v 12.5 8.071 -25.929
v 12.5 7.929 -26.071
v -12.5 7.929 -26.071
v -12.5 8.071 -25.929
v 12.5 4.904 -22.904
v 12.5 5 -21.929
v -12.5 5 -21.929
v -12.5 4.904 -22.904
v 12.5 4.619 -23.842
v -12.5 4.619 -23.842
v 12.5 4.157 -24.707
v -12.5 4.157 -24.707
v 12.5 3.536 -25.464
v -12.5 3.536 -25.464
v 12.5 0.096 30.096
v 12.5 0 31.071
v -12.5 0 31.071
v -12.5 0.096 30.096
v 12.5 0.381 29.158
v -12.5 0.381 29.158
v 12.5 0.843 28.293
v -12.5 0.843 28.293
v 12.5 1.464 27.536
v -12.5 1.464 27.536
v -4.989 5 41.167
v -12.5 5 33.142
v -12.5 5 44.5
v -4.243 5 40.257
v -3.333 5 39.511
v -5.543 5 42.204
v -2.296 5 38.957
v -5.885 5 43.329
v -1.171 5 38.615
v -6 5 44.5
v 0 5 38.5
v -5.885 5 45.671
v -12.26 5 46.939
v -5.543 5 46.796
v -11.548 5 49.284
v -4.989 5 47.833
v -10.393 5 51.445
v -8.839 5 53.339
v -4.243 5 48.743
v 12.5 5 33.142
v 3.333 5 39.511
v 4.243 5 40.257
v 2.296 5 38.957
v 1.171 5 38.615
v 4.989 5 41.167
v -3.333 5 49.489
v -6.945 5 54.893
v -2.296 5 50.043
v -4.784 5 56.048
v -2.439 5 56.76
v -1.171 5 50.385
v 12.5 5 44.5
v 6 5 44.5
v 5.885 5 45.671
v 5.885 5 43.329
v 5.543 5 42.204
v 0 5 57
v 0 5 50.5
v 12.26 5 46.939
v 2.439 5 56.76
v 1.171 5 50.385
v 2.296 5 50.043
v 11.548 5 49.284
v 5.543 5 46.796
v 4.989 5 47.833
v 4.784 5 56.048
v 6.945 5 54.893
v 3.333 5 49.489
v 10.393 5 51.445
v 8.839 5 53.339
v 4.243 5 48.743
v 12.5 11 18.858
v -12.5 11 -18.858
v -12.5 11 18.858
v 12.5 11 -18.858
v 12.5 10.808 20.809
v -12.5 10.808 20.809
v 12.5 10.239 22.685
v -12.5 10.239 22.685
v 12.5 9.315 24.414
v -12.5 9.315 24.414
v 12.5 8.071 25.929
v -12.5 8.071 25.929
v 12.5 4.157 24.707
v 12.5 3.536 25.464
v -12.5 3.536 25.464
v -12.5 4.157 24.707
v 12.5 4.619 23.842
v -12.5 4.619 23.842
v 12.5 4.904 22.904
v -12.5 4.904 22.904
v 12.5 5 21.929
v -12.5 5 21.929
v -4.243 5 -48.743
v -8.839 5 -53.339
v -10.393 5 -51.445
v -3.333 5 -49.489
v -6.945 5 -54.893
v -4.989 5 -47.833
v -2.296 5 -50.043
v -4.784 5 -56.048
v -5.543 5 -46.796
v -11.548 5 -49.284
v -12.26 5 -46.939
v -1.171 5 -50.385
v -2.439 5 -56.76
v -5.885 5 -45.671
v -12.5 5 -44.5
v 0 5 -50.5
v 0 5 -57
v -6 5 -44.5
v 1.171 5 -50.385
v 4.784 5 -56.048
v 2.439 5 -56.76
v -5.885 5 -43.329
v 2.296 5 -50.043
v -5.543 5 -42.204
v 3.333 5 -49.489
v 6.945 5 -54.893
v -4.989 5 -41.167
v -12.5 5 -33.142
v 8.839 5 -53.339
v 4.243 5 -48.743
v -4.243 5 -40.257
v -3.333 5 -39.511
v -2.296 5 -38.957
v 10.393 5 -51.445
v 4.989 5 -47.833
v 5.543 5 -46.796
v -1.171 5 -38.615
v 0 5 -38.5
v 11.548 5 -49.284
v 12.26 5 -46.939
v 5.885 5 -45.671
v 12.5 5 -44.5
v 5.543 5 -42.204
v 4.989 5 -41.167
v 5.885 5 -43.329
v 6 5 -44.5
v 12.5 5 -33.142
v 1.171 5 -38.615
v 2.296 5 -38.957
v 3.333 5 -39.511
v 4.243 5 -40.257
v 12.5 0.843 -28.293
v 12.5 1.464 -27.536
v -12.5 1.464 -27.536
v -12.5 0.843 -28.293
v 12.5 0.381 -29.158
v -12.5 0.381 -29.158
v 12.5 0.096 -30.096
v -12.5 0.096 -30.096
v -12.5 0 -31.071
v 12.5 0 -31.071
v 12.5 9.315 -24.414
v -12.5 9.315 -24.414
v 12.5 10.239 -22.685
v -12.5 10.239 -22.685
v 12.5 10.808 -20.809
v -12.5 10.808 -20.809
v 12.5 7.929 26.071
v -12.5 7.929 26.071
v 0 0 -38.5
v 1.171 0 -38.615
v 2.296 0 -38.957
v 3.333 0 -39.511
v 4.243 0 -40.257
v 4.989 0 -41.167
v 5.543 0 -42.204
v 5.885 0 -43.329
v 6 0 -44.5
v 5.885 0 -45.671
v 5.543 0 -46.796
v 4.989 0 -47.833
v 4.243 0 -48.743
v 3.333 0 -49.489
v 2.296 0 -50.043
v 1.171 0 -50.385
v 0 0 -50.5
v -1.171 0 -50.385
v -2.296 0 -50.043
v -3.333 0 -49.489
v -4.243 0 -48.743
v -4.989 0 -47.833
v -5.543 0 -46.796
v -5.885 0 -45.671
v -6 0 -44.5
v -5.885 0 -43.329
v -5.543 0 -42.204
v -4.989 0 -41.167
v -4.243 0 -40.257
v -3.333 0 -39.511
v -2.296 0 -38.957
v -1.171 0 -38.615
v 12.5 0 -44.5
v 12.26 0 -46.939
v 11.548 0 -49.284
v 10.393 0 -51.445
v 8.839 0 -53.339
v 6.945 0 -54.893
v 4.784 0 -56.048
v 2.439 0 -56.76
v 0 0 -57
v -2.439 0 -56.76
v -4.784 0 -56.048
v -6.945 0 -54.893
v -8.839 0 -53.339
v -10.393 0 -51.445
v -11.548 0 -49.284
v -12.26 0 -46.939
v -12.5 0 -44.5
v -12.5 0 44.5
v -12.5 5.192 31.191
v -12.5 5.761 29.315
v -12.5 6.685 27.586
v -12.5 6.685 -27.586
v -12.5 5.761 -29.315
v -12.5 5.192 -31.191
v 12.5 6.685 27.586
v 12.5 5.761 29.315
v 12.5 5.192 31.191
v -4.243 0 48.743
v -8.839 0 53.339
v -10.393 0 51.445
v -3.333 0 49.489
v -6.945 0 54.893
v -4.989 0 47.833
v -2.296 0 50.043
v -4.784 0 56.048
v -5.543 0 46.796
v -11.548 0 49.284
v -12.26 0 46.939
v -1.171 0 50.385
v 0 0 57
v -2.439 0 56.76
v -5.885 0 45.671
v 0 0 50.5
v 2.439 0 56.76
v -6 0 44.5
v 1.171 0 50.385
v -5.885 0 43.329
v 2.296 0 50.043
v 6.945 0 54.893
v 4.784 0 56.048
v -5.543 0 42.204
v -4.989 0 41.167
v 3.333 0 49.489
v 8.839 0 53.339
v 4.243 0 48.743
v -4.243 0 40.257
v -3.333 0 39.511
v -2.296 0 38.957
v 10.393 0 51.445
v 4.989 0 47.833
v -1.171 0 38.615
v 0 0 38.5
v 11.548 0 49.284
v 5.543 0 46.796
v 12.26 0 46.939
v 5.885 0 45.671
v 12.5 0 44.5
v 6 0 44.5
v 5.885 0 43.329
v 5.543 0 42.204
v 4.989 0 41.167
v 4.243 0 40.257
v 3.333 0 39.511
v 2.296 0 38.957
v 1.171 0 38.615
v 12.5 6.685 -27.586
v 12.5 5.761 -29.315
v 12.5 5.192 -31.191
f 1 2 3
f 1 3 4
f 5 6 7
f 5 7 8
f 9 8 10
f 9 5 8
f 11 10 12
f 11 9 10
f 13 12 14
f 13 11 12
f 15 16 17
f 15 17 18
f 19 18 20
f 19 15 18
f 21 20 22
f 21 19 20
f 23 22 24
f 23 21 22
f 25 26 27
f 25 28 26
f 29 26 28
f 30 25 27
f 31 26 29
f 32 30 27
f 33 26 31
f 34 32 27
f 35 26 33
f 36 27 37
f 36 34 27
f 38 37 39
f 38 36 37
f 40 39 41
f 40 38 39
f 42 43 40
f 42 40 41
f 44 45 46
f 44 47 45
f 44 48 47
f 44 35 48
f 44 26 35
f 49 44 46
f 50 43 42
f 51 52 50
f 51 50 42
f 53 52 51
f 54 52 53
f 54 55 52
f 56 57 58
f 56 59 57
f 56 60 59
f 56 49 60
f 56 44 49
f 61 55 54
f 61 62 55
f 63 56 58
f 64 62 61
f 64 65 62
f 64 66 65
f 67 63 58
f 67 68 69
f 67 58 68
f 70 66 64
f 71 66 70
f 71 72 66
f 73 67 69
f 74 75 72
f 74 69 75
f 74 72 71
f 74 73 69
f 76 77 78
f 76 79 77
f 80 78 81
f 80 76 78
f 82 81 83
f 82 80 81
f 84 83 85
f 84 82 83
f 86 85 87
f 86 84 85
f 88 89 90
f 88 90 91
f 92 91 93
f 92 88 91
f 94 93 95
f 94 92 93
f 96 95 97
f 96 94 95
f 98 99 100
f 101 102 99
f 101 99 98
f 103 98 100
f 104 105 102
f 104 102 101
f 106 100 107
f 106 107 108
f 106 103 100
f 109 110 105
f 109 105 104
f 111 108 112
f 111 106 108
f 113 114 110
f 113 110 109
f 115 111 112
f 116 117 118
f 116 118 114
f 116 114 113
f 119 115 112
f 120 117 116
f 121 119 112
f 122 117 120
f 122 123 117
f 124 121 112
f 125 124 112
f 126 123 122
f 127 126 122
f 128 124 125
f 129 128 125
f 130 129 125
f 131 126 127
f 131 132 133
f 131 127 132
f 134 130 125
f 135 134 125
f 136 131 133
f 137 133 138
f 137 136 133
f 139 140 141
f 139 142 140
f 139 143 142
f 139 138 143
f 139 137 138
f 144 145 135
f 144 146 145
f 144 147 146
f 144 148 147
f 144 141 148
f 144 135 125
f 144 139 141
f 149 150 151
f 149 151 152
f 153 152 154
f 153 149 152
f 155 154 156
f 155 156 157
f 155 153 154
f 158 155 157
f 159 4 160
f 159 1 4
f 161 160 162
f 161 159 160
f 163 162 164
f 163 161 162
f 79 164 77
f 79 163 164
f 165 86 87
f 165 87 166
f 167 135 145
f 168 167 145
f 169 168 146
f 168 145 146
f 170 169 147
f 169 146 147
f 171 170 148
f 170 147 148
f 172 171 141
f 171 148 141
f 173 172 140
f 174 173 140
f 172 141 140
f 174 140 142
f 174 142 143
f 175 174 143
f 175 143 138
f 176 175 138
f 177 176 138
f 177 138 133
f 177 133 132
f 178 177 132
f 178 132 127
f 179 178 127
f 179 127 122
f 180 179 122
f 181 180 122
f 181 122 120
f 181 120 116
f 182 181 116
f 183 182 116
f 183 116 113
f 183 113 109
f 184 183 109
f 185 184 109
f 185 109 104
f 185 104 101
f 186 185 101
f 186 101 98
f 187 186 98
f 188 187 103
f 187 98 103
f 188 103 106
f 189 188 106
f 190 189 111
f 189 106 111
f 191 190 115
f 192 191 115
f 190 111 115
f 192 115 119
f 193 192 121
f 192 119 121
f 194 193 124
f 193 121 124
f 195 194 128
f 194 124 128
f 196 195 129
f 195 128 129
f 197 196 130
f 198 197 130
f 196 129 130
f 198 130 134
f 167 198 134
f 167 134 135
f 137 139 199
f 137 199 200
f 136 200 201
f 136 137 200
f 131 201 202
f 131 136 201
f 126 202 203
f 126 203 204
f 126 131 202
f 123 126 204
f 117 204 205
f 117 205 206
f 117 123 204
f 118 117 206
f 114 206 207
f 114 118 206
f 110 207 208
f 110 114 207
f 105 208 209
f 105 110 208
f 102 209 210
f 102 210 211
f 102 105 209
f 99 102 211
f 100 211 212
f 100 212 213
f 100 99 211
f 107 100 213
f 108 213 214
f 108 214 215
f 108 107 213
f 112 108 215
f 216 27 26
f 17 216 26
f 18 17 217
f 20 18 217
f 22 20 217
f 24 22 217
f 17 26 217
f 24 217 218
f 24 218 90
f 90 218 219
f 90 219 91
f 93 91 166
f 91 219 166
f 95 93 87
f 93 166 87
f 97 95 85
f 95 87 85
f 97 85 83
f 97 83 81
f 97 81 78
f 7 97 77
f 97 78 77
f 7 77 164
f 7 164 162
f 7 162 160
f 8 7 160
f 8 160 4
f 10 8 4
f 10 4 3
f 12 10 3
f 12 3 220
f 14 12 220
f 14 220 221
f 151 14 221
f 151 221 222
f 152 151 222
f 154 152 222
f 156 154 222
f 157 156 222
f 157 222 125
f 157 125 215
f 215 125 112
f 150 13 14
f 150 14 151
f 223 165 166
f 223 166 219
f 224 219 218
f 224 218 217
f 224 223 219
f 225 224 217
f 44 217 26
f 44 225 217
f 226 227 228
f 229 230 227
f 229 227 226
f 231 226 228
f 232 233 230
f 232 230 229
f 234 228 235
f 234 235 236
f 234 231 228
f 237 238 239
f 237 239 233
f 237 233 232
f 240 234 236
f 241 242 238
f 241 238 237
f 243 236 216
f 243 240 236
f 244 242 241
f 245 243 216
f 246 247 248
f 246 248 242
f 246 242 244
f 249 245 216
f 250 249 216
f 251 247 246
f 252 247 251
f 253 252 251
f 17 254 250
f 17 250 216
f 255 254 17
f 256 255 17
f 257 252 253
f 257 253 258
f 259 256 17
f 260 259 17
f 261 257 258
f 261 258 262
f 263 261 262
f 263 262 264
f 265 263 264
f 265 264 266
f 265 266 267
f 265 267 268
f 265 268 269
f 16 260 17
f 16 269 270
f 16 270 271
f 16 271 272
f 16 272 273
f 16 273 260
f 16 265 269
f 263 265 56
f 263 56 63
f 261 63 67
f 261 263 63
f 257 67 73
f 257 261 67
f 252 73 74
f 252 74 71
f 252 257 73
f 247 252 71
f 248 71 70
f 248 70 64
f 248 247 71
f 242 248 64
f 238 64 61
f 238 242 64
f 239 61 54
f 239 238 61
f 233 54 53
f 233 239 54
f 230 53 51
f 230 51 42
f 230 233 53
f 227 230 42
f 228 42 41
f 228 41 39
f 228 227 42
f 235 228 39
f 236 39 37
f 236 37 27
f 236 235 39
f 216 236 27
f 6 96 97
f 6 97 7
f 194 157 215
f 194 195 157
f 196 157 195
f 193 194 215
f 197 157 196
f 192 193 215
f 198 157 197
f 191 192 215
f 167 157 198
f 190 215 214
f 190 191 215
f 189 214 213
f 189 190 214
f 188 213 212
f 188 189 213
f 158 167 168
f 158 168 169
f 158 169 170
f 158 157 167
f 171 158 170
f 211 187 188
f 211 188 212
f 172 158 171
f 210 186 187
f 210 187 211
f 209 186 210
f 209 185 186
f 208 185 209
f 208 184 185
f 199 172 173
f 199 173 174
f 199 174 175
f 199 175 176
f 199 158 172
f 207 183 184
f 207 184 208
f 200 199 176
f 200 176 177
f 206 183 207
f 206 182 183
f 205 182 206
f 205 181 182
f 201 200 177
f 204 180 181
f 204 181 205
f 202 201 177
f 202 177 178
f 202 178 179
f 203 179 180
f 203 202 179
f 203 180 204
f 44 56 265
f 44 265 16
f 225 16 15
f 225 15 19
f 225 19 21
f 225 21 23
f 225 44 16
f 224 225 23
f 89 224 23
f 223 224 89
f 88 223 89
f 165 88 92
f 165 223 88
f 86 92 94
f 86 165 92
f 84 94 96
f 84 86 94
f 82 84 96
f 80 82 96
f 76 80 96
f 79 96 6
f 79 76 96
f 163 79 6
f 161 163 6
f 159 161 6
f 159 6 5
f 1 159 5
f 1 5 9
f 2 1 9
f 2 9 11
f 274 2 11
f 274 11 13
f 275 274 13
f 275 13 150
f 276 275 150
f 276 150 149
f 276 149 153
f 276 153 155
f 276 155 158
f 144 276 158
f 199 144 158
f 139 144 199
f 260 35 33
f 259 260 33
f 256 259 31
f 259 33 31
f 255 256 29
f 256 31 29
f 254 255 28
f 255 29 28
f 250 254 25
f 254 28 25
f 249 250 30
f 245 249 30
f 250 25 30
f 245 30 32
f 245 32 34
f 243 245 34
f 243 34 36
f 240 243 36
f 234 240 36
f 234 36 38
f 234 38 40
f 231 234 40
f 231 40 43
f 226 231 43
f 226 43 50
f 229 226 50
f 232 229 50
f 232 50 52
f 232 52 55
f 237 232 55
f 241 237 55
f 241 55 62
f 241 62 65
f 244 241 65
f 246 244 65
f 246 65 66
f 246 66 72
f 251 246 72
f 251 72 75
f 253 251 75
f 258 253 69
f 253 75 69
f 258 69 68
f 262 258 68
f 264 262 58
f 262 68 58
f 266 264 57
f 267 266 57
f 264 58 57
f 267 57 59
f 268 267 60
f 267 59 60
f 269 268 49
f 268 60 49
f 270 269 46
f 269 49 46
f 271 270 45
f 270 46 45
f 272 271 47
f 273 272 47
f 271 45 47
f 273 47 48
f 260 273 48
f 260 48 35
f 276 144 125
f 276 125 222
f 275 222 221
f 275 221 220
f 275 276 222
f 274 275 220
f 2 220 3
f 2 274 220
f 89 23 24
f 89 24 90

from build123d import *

# Parameters (mm, degrees)
BOSS_EXTRUDE2_DEPTH = 12.5
SKETCH2_R           = 6
CUT_EXTRUDE1_DEPTH  = 59.662168388
FILLET1_RADIUS      = 12.5
FILLET1_LENGTH      = 5
FILLET2_RADIUS      = 12.5
FILLET2_LENGTH      = 5


with BuildPart() as part:
    # Sketch1 → Boss-Extrude2 (new, symmetric)
    with BuildSketch(Plane(origin=(0, 0, 0), x_dir=(0, 0, -1), z_dir=(1, 0, 0))):
        with BuildLine():
            Line((0, 5), (0, 11))
            Line((0, 11), (-18.857864376, 11))
            ThreePointArc((-18.857864376, 11), (-22.6846987, 10.238795325), (-25.928932188, 8.071067812))
            Line((-25.928932188, 8.071067812), (-26.071067812, 7.928932188))
            ThreePointArc((-26.071067812, 7.928932188), (-29.3153013, 5.761204675), (-33.142135624, 5))
            Line((-33.142135624, 5), (-57, 5))
            Line((-57, 5), (-57, 0))
            Line((-57, 0), (-31.071067812, 0))
            ThreePointArc((-31.071067812, 0), (-29.15765065, 0.380602337), (-27.535533906, 1.464466094))
            Line((-27.535533906, 1.464466094), (-25.464466094, 3.535533906))
            ThreePointArc((-25.464466094, 3.535533906), (-23.84234935, 4.619397663), (-21.928932188, 5))
            Line((-21.928932188, 5), (0, 5))
        make_face()
        with BuildLine():
            Line((18.857864376, 11), (0, 11))
            Line((0, 11), (0, 5))
            Line((0, 5), (21.928932188, 5))
            ThreePointArc((21.928932188, 5), (23.84234935, 4.619397663), (25.464466094, 3.535533906))
            Line((25.464466094, 3.535533906), (27.535533906, 1.464466094))
            ThreePointArc((27.535533906, 1.464466094), (29.15765065, 0.380602337), (31.071067812, 0))
            Line((31.071067812, 0), (57, 0))
            Line((57, 0), (57, 5))
            Line((57, 5), (33.142135624, 5))
            ThreePointArc((33.142135624, 5), (29.3153013, 5.761204675), (26.071067812, 7.928932188))
            Line((26.071067812, 7.928932188), (25.928932188, 8.071067812))
            ThreePointArc((25.928932188, 8.071067812), (22.6846987, 10.238795325), (18.857864376, 11))
        make_face()
    extrude(amount=BOSS_EXTRUDE2_DEPTH, both=True)

    # Sketch2 → Cut-Extrude1 (cut, through all)
    with BuildSketch(Plane(origin=(0, 5, 0), x_dir=(1, 0, 0), z_dir=(0, 1, 0))):
        with Locations(Location((0, 44.5, 0), (0, 0, 270))):
            Circle(SKETCH2_R)
        with Locations(Location((0, -44.5, 0), (0, 0, 90))):
            Circle(SKETCH2_R)
    extrude(amount=-CUT_EXTRUDE1_DEPTH, mode=Mode.SUBTRACT)

    # Fillet1: full round fillet: the end face becomes a half cylinder, R = half its width
    fillet1_face = Plane((0, 2.5, -57), x_dir=(0, 1, 0), z_dir=(0, 0, -1))  # on the end face: x along it, z out of the body
    fillet1_slab = fillet1_face.offset(-FILLET1_RADIUS / 2) * Box(FILLET1_LENGTH, 2 * FILLET1_RADIUS, FILLET1_RADIUS, mode=Mode.PRIVATE)  # the body's end, R deep
    fillet1_round = Plane((0, 2.5, -44.5), x_dir=(0, 0, -1), z_dir=(0, 1, 0)) * Cylinder(FILLET1_RADIUS, FILLET1_LENGTH, mode=Mode.PRIVATE)  # its axis R under the face
    add(fillet1_slab - fillet1_round, mode=Mode.SUBTRACT)

    # Fillet2: full round fillet: the end face becomes a half cylinder, R = half its width
    fillet2_face = Plane((0, 2.5, 57), x_dir=(0, -1, 0), z_dir=(0, 0, 1))  # on the end face: x along it, z out of the body
    fillet2_slab = fillet2_face.offset(-FILLET2_RADIUS / 2) * Box(FILLET2_LENGTH, 2 * FILLET2_RADIUS, FILLET2_RADIUS, mode=Mode.PRIVATE)  # the body's end, R deep
    fillet2_round = Plane((0, 2.5, 44.5), x_dir=(0, 0, 1), z_dir=(0, -1, 0)) * Cylinder(FILLET2_RADIUS, FILLET2_LENGTH, mode=Mode.PRIVATE)  # its axis R under the face
    add(fillet2_slab - fillet2_round, mode=Mode.SUBTRACT)


solid = part.part
